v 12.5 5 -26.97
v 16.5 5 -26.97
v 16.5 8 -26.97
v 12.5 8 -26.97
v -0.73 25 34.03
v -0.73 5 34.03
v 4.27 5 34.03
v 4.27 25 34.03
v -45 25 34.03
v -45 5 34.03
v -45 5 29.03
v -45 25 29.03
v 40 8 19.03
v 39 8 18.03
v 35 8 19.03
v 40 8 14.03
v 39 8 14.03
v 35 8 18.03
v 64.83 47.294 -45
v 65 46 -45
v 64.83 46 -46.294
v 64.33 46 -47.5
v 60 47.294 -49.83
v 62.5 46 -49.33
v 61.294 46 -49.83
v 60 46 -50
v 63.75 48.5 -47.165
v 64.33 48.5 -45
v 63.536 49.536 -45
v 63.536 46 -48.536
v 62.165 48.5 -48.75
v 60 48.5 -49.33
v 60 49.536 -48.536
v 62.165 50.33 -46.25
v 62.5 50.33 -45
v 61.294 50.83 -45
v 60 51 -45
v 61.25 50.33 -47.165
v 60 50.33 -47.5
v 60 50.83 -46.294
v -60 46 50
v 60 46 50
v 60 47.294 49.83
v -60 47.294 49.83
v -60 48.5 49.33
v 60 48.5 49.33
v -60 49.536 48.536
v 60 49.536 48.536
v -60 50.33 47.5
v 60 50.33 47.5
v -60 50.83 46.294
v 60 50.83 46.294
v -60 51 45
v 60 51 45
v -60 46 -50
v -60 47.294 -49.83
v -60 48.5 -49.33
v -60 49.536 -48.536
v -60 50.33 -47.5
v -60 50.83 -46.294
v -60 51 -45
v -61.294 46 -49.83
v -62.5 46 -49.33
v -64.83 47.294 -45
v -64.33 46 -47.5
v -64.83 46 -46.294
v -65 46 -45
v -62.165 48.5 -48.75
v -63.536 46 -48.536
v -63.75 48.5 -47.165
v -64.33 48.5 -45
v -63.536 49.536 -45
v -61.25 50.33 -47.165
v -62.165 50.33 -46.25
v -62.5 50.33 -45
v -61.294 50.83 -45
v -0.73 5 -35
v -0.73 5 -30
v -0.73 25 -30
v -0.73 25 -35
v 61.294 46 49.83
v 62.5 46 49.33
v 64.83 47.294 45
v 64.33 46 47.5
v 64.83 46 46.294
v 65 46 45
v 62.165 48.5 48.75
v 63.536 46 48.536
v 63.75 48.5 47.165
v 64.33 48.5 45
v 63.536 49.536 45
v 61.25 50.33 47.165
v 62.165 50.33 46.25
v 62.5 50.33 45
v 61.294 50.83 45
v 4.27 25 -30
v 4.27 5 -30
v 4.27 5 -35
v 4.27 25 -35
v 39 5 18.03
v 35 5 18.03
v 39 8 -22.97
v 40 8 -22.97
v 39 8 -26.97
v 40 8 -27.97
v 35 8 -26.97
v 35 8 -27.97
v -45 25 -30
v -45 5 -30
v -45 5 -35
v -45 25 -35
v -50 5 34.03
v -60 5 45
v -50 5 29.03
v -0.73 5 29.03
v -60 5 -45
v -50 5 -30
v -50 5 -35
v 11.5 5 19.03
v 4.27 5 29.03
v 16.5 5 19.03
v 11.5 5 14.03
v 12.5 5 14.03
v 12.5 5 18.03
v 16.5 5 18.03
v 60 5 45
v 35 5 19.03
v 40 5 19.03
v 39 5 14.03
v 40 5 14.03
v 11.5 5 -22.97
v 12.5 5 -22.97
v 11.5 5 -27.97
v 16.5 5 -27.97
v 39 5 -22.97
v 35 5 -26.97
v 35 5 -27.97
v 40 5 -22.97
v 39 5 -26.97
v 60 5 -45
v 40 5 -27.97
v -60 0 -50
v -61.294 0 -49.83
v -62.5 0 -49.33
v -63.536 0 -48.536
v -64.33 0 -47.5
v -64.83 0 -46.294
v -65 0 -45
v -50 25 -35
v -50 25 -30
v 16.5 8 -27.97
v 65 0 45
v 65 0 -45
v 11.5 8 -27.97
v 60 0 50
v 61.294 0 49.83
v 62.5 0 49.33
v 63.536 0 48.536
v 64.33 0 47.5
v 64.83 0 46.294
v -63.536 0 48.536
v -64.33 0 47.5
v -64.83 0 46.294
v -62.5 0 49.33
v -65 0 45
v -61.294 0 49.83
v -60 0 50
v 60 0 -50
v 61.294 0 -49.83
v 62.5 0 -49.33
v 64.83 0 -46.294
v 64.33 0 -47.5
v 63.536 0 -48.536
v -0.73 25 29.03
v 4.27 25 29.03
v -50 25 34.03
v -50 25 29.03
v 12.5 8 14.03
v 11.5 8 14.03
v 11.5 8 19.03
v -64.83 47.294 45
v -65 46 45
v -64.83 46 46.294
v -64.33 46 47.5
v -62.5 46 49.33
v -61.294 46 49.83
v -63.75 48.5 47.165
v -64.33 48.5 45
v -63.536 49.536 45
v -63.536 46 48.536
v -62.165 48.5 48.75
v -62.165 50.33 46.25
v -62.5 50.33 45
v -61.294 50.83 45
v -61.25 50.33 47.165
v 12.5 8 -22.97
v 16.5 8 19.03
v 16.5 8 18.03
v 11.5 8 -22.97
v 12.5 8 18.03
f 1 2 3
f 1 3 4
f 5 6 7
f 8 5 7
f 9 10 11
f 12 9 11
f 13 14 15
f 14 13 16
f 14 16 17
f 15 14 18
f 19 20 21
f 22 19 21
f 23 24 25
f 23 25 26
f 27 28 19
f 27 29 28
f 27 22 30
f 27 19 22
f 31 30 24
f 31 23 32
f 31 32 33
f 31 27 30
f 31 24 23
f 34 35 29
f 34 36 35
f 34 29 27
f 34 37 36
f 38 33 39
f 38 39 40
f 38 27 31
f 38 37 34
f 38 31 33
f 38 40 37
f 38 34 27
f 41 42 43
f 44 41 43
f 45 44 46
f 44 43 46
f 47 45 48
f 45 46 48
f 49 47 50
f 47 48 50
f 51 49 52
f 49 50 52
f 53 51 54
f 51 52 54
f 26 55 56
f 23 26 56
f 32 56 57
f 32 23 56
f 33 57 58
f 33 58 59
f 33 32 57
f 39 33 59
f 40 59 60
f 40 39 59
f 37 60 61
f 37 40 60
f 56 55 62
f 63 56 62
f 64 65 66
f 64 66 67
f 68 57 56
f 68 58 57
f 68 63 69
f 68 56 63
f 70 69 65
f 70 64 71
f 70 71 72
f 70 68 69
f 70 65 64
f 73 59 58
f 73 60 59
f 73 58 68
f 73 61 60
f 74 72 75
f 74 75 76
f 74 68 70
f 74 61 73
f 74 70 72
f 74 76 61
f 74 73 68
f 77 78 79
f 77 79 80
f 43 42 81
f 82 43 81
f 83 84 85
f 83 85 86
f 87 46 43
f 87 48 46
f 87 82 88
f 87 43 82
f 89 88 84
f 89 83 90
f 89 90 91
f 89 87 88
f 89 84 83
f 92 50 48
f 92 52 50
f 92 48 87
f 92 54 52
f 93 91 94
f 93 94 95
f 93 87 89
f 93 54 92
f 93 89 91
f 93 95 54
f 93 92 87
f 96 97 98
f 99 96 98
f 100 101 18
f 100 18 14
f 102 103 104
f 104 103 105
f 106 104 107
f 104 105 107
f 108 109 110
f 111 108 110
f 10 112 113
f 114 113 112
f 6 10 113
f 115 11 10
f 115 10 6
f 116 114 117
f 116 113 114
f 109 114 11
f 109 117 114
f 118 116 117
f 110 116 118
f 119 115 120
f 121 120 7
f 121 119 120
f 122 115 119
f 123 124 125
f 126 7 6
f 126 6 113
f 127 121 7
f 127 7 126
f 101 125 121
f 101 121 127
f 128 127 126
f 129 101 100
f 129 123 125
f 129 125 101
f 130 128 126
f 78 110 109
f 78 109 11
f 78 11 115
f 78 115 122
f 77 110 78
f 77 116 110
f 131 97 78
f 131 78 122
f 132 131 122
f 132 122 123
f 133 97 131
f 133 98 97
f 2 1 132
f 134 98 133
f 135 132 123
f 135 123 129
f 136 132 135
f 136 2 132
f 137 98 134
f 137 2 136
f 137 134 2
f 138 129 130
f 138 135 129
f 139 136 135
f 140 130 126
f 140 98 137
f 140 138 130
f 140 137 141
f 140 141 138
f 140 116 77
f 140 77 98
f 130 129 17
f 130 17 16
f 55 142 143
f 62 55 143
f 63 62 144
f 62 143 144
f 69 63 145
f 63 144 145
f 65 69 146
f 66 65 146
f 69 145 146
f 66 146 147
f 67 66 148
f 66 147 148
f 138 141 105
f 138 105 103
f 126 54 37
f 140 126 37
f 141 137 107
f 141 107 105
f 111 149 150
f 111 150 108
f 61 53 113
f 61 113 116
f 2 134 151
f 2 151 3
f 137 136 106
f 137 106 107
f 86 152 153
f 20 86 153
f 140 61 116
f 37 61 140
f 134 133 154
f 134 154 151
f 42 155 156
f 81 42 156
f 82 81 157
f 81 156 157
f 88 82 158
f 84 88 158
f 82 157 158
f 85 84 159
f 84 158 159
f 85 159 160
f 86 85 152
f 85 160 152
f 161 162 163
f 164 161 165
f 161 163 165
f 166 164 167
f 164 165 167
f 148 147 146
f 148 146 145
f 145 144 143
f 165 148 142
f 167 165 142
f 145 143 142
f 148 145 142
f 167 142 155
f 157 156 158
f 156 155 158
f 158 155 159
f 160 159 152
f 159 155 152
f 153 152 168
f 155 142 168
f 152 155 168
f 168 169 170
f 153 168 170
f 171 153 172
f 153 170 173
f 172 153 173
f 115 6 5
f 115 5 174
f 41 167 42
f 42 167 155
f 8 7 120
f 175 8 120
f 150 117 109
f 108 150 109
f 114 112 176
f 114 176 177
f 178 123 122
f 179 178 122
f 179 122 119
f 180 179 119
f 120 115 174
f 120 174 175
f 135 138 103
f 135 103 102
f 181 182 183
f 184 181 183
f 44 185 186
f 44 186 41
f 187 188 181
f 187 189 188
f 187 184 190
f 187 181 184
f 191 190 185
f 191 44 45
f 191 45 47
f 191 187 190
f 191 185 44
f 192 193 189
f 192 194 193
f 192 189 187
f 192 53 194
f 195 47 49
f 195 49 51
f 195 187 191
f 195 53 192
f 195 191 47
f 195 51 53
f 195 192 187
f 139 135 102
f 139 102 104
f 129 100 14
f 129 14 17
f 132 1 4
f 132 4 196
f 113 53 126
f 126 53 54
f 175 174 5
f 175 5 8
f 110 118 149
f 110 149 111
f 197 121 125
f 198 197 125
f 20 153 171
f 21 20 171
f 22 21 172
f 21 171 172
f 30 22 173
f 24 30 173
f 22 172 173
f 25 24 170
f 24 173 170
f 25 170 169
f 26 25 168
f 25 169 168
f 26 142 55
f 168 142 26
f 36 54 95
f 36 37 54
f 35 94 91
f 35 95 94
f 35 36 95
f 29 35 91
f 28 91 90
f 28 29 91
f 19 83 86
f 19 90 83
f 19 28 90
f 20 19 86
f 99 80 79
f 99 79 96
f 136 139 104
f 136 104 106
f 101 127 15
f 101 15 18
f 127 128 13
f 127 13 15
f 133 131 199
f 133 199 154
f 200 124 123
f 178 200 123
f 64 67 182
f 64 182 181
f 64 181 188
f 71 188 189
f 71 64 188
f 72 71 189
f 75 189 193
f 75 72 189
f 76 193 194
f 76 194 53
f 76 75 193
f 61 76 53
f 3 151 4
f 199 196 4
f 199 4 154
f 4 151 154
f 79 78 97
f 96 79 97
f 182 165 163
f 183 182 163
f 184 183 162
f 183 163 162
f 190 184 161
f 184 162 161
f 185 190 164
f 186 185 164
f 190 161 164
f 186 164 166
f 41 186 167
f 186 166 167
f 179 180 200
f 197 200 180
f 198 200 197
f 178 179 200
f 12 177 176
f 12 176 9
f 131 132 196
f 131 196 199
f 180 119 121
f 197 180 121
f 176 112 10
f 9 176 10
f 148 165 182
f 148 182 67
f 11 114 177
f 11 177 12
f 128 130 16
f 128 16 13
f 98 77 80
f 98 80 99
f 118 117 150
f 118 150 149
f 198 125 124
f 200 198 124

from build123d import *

# Parameters (mm, degrees)
SKETCH1_W           = 130
SKETCH1_H           = 100
BOSS_EXTRUDE1_DEPTH = 51
SKETCH2_W           = 120
SKETCH2_H           = 90
CUT_EXTRUDE1_DEPTH  = 46
FILLET2_R           = 5
FILLET4_R           = 5
SKETCH6_W           = 5
SKETCH6_H           = 5
BOSS_EXTRUDE2_DEPTH = 20
BOSS_EXTRUDE3_DEPTH = 3


# Some blends are built 0.0001 mm under size
with BuildPart() as part:
    # Sketch1 → Boss-Extrude1 (new body)
    with BuildSketch(Plane(origin=(0, 0, 0), x_dir=(1, 0, 0), z_dir=(0, 1, 0))):
        Rectangle(SKETCH1_W, SKETCH1_H)
    extrude(amount=BOSS_EXTRUDE1_DEPTH)

    # Sketch2 → Cut-Extrude1 (cut)
    with BuildSketch(Plane(origin=(0, 51, 0), x_dir=(1, 0, 0), z_dir=(0, 1, 0))):
        Rectangle(SKETCH2_W, SKETCH2_H)
    extrude(amount=-CUT_EXTRUDE1_DEPTH, mode=Mode.SUBTRACT)

    # Fillet2
    fillet2_edges = [part.edges().sort_by_distance(p)[0] for p in [
        (-65, 51, 0),
        (0, 51, 50),
        (65, 51, 0),
        (0, 51, -50),
    ]]
    fillet(fillet2_edges, radius=FILLET2_R - 0.0001)  # a hair under: the kernel refuses the full size

    # Fillet4
    # the kernel refuses this fillet: 5 mm, written as the material it takes off along each edge
    with BuildSketch(Plane(origin=(60, 51, 45), x_dir=(0, 0, 1), z_dir=(-1, 0, 0))) as fillet4_piece_1:
        with BuildLine():
            CenterArc((0.0001, -4.9999), 4.9999, 0, 90)
            Line((5, -4.9999), (5, 0))
            Line((5, 0), (0.0001, 0))
        make_face()
    revolve(axis=Axis((60, 51, 45), (0, 1, 0)), revolution_arc=90, mode=Mode.SUBTRACT)
    with BuildSketch(Plane(origin=(-60, 51, 45), x_dir=(-1, 0, 0), z_dir=(0, 0, -1))) as fillet4_piece_2:
        with BuildLine():
            CenterArc((0.0001, -4.9999), 4.9999, 0, 90)
            Line((5, -4.9999), (5, 0))
            Line((5, 0), (0.0001, 0))
        make_face()
    revolve(axis=Axis((-60, 51, 45), (0, 1, 0)), revolution_arc=90, mode=Mode.SUBTRACT)
    with BuildSketch(Plane(origin=(60, 51, -45), x_dir=(1, 0, 0), z_dir=(0, 0, 1))) as fillet4_piece_3:
        with BuildLine():
            CenterArc((0.0001, -4.9999), 4.9999, 0, 90)
            Line((5, -4.9999), (5, 0))
            Line((5, 0), (0.0001, 0))
        make_face()
    revolve(axis=Axis((60, 51, -45), (0, 1, 0)), revolution_arc=90, mode=Mode.SUBTRACT)
    with BuildSketch(Plane(origin=(-60, 51, -45), x_dir=(0, 0, -1), z_dir=(1, 0, 0))) as fillet4_piece_4:
        with BuildLine():
            CenterArc((0.0001, -4.9999), 4.9999, 0, 90)
            Line((5, -4.9999), (5, 0))
            Line((5, 0), (0.0001, 0))
        make_face()
    revolve(axis=Axis((-60, 51, -45), (0, 1, 0)), revolution_arc=90, mode=Mode.SUBTRACT)
    with BuildSketch(Plane(origin=(-65, -12.5, -50), x_dir=(1, 0, 0), z_dir=(0, 1, 0)), Plane(origin=(-65, -12.5, 50), x_dir=(0, 0, -1), z_dir=(0, 1, 0))) as fillet4_piece_5:
        with BuildLine():
            CenterArc((FILLET4_R, -FILLET4_R), FILLET4_R, 90, 90)
            Line((0, -FILLET4_R), (0, 0))
            Line((0, 0), (FILLET4_R, 0))
        make_face()
    extrude(amount=63.5, mode=Mode.SUBTRACT)
    with BuildSketch(Plane(origin=(65, -12.5, -50), x_dir=(-1, 0, 0), z_dir=(0, 1, 0)), Plane(origin=(65, -12.5, 50), x_dir=(0, 0, -1), z_dir=(0, 1, 0))) as fillet4_piece_6:
        with BuildLine():
            CenterArc((FILLET4_R, FILLET4_R), FILLET4_R, 180, 90)
            Line((0, FILLET4_R), (0, 0))
            Line((0, 0), (FILLET4_R, 0))
        make_face()
    extrude(amount=63.5, mode=Mode.SUBTRACT)

    # Sketch6 → Boss-Extrude2 (add)
    with BuildSketch(Plane(origin=(0, 5, 0), x_dir=(1, 0, 0), z_dir=(0, 1, 0))):
        with Locations((-47.5, 32.5)):
            Rectangle(SKETCH6_W, SKETCH6_H)
        with Locations((-47.5, -31.53)):
            Rectangle(SKETCH6_W, SKETCH6_H)
        with Locations((1.77, 32.5)):
            Rectangle(SKETCH6_W, SKETCH6_H)
        with Locations((1.77, -31.53)):
            Rectangle(SKETCH6_W, SKETCH6_H)
    extrude(amount=BOSS_EXTRUDE2_DEPTH)

    # Sketch9 → Boss-Extrude3 (add)
    with BuildSketch(Plane(origin=(0, 5, 0), x_dir=(1, 0, 0), z_dir=(0, 1, 0))):
        Polygon((11.5, -14.03), (11.5, -19.03), (16.5, -19.03), (16.5, -18.03), (12.5, -18.03), (12.5, -14.03), align=None)
        Polygon((11.5, 27.97), (16.5, 27.97), (16.5, 26.97), (12.5, 26.97), (12.5, 22.97), (11.5, 22.97), align=None)
        Polygon((40, 27.97), (40, 22.97), (39, 22.97), (39, 26.97), (35, 26.97), (35, 27.97), align=None)
        Polygon((40, -19.03), (35, -19.03), (35, -18.03), (39, -18.03), (39, -14.03), (40, -14.03), align=None)
    extrude(amount=BOSS_EXTRUDE3_DEPTH)


solid = part.part
